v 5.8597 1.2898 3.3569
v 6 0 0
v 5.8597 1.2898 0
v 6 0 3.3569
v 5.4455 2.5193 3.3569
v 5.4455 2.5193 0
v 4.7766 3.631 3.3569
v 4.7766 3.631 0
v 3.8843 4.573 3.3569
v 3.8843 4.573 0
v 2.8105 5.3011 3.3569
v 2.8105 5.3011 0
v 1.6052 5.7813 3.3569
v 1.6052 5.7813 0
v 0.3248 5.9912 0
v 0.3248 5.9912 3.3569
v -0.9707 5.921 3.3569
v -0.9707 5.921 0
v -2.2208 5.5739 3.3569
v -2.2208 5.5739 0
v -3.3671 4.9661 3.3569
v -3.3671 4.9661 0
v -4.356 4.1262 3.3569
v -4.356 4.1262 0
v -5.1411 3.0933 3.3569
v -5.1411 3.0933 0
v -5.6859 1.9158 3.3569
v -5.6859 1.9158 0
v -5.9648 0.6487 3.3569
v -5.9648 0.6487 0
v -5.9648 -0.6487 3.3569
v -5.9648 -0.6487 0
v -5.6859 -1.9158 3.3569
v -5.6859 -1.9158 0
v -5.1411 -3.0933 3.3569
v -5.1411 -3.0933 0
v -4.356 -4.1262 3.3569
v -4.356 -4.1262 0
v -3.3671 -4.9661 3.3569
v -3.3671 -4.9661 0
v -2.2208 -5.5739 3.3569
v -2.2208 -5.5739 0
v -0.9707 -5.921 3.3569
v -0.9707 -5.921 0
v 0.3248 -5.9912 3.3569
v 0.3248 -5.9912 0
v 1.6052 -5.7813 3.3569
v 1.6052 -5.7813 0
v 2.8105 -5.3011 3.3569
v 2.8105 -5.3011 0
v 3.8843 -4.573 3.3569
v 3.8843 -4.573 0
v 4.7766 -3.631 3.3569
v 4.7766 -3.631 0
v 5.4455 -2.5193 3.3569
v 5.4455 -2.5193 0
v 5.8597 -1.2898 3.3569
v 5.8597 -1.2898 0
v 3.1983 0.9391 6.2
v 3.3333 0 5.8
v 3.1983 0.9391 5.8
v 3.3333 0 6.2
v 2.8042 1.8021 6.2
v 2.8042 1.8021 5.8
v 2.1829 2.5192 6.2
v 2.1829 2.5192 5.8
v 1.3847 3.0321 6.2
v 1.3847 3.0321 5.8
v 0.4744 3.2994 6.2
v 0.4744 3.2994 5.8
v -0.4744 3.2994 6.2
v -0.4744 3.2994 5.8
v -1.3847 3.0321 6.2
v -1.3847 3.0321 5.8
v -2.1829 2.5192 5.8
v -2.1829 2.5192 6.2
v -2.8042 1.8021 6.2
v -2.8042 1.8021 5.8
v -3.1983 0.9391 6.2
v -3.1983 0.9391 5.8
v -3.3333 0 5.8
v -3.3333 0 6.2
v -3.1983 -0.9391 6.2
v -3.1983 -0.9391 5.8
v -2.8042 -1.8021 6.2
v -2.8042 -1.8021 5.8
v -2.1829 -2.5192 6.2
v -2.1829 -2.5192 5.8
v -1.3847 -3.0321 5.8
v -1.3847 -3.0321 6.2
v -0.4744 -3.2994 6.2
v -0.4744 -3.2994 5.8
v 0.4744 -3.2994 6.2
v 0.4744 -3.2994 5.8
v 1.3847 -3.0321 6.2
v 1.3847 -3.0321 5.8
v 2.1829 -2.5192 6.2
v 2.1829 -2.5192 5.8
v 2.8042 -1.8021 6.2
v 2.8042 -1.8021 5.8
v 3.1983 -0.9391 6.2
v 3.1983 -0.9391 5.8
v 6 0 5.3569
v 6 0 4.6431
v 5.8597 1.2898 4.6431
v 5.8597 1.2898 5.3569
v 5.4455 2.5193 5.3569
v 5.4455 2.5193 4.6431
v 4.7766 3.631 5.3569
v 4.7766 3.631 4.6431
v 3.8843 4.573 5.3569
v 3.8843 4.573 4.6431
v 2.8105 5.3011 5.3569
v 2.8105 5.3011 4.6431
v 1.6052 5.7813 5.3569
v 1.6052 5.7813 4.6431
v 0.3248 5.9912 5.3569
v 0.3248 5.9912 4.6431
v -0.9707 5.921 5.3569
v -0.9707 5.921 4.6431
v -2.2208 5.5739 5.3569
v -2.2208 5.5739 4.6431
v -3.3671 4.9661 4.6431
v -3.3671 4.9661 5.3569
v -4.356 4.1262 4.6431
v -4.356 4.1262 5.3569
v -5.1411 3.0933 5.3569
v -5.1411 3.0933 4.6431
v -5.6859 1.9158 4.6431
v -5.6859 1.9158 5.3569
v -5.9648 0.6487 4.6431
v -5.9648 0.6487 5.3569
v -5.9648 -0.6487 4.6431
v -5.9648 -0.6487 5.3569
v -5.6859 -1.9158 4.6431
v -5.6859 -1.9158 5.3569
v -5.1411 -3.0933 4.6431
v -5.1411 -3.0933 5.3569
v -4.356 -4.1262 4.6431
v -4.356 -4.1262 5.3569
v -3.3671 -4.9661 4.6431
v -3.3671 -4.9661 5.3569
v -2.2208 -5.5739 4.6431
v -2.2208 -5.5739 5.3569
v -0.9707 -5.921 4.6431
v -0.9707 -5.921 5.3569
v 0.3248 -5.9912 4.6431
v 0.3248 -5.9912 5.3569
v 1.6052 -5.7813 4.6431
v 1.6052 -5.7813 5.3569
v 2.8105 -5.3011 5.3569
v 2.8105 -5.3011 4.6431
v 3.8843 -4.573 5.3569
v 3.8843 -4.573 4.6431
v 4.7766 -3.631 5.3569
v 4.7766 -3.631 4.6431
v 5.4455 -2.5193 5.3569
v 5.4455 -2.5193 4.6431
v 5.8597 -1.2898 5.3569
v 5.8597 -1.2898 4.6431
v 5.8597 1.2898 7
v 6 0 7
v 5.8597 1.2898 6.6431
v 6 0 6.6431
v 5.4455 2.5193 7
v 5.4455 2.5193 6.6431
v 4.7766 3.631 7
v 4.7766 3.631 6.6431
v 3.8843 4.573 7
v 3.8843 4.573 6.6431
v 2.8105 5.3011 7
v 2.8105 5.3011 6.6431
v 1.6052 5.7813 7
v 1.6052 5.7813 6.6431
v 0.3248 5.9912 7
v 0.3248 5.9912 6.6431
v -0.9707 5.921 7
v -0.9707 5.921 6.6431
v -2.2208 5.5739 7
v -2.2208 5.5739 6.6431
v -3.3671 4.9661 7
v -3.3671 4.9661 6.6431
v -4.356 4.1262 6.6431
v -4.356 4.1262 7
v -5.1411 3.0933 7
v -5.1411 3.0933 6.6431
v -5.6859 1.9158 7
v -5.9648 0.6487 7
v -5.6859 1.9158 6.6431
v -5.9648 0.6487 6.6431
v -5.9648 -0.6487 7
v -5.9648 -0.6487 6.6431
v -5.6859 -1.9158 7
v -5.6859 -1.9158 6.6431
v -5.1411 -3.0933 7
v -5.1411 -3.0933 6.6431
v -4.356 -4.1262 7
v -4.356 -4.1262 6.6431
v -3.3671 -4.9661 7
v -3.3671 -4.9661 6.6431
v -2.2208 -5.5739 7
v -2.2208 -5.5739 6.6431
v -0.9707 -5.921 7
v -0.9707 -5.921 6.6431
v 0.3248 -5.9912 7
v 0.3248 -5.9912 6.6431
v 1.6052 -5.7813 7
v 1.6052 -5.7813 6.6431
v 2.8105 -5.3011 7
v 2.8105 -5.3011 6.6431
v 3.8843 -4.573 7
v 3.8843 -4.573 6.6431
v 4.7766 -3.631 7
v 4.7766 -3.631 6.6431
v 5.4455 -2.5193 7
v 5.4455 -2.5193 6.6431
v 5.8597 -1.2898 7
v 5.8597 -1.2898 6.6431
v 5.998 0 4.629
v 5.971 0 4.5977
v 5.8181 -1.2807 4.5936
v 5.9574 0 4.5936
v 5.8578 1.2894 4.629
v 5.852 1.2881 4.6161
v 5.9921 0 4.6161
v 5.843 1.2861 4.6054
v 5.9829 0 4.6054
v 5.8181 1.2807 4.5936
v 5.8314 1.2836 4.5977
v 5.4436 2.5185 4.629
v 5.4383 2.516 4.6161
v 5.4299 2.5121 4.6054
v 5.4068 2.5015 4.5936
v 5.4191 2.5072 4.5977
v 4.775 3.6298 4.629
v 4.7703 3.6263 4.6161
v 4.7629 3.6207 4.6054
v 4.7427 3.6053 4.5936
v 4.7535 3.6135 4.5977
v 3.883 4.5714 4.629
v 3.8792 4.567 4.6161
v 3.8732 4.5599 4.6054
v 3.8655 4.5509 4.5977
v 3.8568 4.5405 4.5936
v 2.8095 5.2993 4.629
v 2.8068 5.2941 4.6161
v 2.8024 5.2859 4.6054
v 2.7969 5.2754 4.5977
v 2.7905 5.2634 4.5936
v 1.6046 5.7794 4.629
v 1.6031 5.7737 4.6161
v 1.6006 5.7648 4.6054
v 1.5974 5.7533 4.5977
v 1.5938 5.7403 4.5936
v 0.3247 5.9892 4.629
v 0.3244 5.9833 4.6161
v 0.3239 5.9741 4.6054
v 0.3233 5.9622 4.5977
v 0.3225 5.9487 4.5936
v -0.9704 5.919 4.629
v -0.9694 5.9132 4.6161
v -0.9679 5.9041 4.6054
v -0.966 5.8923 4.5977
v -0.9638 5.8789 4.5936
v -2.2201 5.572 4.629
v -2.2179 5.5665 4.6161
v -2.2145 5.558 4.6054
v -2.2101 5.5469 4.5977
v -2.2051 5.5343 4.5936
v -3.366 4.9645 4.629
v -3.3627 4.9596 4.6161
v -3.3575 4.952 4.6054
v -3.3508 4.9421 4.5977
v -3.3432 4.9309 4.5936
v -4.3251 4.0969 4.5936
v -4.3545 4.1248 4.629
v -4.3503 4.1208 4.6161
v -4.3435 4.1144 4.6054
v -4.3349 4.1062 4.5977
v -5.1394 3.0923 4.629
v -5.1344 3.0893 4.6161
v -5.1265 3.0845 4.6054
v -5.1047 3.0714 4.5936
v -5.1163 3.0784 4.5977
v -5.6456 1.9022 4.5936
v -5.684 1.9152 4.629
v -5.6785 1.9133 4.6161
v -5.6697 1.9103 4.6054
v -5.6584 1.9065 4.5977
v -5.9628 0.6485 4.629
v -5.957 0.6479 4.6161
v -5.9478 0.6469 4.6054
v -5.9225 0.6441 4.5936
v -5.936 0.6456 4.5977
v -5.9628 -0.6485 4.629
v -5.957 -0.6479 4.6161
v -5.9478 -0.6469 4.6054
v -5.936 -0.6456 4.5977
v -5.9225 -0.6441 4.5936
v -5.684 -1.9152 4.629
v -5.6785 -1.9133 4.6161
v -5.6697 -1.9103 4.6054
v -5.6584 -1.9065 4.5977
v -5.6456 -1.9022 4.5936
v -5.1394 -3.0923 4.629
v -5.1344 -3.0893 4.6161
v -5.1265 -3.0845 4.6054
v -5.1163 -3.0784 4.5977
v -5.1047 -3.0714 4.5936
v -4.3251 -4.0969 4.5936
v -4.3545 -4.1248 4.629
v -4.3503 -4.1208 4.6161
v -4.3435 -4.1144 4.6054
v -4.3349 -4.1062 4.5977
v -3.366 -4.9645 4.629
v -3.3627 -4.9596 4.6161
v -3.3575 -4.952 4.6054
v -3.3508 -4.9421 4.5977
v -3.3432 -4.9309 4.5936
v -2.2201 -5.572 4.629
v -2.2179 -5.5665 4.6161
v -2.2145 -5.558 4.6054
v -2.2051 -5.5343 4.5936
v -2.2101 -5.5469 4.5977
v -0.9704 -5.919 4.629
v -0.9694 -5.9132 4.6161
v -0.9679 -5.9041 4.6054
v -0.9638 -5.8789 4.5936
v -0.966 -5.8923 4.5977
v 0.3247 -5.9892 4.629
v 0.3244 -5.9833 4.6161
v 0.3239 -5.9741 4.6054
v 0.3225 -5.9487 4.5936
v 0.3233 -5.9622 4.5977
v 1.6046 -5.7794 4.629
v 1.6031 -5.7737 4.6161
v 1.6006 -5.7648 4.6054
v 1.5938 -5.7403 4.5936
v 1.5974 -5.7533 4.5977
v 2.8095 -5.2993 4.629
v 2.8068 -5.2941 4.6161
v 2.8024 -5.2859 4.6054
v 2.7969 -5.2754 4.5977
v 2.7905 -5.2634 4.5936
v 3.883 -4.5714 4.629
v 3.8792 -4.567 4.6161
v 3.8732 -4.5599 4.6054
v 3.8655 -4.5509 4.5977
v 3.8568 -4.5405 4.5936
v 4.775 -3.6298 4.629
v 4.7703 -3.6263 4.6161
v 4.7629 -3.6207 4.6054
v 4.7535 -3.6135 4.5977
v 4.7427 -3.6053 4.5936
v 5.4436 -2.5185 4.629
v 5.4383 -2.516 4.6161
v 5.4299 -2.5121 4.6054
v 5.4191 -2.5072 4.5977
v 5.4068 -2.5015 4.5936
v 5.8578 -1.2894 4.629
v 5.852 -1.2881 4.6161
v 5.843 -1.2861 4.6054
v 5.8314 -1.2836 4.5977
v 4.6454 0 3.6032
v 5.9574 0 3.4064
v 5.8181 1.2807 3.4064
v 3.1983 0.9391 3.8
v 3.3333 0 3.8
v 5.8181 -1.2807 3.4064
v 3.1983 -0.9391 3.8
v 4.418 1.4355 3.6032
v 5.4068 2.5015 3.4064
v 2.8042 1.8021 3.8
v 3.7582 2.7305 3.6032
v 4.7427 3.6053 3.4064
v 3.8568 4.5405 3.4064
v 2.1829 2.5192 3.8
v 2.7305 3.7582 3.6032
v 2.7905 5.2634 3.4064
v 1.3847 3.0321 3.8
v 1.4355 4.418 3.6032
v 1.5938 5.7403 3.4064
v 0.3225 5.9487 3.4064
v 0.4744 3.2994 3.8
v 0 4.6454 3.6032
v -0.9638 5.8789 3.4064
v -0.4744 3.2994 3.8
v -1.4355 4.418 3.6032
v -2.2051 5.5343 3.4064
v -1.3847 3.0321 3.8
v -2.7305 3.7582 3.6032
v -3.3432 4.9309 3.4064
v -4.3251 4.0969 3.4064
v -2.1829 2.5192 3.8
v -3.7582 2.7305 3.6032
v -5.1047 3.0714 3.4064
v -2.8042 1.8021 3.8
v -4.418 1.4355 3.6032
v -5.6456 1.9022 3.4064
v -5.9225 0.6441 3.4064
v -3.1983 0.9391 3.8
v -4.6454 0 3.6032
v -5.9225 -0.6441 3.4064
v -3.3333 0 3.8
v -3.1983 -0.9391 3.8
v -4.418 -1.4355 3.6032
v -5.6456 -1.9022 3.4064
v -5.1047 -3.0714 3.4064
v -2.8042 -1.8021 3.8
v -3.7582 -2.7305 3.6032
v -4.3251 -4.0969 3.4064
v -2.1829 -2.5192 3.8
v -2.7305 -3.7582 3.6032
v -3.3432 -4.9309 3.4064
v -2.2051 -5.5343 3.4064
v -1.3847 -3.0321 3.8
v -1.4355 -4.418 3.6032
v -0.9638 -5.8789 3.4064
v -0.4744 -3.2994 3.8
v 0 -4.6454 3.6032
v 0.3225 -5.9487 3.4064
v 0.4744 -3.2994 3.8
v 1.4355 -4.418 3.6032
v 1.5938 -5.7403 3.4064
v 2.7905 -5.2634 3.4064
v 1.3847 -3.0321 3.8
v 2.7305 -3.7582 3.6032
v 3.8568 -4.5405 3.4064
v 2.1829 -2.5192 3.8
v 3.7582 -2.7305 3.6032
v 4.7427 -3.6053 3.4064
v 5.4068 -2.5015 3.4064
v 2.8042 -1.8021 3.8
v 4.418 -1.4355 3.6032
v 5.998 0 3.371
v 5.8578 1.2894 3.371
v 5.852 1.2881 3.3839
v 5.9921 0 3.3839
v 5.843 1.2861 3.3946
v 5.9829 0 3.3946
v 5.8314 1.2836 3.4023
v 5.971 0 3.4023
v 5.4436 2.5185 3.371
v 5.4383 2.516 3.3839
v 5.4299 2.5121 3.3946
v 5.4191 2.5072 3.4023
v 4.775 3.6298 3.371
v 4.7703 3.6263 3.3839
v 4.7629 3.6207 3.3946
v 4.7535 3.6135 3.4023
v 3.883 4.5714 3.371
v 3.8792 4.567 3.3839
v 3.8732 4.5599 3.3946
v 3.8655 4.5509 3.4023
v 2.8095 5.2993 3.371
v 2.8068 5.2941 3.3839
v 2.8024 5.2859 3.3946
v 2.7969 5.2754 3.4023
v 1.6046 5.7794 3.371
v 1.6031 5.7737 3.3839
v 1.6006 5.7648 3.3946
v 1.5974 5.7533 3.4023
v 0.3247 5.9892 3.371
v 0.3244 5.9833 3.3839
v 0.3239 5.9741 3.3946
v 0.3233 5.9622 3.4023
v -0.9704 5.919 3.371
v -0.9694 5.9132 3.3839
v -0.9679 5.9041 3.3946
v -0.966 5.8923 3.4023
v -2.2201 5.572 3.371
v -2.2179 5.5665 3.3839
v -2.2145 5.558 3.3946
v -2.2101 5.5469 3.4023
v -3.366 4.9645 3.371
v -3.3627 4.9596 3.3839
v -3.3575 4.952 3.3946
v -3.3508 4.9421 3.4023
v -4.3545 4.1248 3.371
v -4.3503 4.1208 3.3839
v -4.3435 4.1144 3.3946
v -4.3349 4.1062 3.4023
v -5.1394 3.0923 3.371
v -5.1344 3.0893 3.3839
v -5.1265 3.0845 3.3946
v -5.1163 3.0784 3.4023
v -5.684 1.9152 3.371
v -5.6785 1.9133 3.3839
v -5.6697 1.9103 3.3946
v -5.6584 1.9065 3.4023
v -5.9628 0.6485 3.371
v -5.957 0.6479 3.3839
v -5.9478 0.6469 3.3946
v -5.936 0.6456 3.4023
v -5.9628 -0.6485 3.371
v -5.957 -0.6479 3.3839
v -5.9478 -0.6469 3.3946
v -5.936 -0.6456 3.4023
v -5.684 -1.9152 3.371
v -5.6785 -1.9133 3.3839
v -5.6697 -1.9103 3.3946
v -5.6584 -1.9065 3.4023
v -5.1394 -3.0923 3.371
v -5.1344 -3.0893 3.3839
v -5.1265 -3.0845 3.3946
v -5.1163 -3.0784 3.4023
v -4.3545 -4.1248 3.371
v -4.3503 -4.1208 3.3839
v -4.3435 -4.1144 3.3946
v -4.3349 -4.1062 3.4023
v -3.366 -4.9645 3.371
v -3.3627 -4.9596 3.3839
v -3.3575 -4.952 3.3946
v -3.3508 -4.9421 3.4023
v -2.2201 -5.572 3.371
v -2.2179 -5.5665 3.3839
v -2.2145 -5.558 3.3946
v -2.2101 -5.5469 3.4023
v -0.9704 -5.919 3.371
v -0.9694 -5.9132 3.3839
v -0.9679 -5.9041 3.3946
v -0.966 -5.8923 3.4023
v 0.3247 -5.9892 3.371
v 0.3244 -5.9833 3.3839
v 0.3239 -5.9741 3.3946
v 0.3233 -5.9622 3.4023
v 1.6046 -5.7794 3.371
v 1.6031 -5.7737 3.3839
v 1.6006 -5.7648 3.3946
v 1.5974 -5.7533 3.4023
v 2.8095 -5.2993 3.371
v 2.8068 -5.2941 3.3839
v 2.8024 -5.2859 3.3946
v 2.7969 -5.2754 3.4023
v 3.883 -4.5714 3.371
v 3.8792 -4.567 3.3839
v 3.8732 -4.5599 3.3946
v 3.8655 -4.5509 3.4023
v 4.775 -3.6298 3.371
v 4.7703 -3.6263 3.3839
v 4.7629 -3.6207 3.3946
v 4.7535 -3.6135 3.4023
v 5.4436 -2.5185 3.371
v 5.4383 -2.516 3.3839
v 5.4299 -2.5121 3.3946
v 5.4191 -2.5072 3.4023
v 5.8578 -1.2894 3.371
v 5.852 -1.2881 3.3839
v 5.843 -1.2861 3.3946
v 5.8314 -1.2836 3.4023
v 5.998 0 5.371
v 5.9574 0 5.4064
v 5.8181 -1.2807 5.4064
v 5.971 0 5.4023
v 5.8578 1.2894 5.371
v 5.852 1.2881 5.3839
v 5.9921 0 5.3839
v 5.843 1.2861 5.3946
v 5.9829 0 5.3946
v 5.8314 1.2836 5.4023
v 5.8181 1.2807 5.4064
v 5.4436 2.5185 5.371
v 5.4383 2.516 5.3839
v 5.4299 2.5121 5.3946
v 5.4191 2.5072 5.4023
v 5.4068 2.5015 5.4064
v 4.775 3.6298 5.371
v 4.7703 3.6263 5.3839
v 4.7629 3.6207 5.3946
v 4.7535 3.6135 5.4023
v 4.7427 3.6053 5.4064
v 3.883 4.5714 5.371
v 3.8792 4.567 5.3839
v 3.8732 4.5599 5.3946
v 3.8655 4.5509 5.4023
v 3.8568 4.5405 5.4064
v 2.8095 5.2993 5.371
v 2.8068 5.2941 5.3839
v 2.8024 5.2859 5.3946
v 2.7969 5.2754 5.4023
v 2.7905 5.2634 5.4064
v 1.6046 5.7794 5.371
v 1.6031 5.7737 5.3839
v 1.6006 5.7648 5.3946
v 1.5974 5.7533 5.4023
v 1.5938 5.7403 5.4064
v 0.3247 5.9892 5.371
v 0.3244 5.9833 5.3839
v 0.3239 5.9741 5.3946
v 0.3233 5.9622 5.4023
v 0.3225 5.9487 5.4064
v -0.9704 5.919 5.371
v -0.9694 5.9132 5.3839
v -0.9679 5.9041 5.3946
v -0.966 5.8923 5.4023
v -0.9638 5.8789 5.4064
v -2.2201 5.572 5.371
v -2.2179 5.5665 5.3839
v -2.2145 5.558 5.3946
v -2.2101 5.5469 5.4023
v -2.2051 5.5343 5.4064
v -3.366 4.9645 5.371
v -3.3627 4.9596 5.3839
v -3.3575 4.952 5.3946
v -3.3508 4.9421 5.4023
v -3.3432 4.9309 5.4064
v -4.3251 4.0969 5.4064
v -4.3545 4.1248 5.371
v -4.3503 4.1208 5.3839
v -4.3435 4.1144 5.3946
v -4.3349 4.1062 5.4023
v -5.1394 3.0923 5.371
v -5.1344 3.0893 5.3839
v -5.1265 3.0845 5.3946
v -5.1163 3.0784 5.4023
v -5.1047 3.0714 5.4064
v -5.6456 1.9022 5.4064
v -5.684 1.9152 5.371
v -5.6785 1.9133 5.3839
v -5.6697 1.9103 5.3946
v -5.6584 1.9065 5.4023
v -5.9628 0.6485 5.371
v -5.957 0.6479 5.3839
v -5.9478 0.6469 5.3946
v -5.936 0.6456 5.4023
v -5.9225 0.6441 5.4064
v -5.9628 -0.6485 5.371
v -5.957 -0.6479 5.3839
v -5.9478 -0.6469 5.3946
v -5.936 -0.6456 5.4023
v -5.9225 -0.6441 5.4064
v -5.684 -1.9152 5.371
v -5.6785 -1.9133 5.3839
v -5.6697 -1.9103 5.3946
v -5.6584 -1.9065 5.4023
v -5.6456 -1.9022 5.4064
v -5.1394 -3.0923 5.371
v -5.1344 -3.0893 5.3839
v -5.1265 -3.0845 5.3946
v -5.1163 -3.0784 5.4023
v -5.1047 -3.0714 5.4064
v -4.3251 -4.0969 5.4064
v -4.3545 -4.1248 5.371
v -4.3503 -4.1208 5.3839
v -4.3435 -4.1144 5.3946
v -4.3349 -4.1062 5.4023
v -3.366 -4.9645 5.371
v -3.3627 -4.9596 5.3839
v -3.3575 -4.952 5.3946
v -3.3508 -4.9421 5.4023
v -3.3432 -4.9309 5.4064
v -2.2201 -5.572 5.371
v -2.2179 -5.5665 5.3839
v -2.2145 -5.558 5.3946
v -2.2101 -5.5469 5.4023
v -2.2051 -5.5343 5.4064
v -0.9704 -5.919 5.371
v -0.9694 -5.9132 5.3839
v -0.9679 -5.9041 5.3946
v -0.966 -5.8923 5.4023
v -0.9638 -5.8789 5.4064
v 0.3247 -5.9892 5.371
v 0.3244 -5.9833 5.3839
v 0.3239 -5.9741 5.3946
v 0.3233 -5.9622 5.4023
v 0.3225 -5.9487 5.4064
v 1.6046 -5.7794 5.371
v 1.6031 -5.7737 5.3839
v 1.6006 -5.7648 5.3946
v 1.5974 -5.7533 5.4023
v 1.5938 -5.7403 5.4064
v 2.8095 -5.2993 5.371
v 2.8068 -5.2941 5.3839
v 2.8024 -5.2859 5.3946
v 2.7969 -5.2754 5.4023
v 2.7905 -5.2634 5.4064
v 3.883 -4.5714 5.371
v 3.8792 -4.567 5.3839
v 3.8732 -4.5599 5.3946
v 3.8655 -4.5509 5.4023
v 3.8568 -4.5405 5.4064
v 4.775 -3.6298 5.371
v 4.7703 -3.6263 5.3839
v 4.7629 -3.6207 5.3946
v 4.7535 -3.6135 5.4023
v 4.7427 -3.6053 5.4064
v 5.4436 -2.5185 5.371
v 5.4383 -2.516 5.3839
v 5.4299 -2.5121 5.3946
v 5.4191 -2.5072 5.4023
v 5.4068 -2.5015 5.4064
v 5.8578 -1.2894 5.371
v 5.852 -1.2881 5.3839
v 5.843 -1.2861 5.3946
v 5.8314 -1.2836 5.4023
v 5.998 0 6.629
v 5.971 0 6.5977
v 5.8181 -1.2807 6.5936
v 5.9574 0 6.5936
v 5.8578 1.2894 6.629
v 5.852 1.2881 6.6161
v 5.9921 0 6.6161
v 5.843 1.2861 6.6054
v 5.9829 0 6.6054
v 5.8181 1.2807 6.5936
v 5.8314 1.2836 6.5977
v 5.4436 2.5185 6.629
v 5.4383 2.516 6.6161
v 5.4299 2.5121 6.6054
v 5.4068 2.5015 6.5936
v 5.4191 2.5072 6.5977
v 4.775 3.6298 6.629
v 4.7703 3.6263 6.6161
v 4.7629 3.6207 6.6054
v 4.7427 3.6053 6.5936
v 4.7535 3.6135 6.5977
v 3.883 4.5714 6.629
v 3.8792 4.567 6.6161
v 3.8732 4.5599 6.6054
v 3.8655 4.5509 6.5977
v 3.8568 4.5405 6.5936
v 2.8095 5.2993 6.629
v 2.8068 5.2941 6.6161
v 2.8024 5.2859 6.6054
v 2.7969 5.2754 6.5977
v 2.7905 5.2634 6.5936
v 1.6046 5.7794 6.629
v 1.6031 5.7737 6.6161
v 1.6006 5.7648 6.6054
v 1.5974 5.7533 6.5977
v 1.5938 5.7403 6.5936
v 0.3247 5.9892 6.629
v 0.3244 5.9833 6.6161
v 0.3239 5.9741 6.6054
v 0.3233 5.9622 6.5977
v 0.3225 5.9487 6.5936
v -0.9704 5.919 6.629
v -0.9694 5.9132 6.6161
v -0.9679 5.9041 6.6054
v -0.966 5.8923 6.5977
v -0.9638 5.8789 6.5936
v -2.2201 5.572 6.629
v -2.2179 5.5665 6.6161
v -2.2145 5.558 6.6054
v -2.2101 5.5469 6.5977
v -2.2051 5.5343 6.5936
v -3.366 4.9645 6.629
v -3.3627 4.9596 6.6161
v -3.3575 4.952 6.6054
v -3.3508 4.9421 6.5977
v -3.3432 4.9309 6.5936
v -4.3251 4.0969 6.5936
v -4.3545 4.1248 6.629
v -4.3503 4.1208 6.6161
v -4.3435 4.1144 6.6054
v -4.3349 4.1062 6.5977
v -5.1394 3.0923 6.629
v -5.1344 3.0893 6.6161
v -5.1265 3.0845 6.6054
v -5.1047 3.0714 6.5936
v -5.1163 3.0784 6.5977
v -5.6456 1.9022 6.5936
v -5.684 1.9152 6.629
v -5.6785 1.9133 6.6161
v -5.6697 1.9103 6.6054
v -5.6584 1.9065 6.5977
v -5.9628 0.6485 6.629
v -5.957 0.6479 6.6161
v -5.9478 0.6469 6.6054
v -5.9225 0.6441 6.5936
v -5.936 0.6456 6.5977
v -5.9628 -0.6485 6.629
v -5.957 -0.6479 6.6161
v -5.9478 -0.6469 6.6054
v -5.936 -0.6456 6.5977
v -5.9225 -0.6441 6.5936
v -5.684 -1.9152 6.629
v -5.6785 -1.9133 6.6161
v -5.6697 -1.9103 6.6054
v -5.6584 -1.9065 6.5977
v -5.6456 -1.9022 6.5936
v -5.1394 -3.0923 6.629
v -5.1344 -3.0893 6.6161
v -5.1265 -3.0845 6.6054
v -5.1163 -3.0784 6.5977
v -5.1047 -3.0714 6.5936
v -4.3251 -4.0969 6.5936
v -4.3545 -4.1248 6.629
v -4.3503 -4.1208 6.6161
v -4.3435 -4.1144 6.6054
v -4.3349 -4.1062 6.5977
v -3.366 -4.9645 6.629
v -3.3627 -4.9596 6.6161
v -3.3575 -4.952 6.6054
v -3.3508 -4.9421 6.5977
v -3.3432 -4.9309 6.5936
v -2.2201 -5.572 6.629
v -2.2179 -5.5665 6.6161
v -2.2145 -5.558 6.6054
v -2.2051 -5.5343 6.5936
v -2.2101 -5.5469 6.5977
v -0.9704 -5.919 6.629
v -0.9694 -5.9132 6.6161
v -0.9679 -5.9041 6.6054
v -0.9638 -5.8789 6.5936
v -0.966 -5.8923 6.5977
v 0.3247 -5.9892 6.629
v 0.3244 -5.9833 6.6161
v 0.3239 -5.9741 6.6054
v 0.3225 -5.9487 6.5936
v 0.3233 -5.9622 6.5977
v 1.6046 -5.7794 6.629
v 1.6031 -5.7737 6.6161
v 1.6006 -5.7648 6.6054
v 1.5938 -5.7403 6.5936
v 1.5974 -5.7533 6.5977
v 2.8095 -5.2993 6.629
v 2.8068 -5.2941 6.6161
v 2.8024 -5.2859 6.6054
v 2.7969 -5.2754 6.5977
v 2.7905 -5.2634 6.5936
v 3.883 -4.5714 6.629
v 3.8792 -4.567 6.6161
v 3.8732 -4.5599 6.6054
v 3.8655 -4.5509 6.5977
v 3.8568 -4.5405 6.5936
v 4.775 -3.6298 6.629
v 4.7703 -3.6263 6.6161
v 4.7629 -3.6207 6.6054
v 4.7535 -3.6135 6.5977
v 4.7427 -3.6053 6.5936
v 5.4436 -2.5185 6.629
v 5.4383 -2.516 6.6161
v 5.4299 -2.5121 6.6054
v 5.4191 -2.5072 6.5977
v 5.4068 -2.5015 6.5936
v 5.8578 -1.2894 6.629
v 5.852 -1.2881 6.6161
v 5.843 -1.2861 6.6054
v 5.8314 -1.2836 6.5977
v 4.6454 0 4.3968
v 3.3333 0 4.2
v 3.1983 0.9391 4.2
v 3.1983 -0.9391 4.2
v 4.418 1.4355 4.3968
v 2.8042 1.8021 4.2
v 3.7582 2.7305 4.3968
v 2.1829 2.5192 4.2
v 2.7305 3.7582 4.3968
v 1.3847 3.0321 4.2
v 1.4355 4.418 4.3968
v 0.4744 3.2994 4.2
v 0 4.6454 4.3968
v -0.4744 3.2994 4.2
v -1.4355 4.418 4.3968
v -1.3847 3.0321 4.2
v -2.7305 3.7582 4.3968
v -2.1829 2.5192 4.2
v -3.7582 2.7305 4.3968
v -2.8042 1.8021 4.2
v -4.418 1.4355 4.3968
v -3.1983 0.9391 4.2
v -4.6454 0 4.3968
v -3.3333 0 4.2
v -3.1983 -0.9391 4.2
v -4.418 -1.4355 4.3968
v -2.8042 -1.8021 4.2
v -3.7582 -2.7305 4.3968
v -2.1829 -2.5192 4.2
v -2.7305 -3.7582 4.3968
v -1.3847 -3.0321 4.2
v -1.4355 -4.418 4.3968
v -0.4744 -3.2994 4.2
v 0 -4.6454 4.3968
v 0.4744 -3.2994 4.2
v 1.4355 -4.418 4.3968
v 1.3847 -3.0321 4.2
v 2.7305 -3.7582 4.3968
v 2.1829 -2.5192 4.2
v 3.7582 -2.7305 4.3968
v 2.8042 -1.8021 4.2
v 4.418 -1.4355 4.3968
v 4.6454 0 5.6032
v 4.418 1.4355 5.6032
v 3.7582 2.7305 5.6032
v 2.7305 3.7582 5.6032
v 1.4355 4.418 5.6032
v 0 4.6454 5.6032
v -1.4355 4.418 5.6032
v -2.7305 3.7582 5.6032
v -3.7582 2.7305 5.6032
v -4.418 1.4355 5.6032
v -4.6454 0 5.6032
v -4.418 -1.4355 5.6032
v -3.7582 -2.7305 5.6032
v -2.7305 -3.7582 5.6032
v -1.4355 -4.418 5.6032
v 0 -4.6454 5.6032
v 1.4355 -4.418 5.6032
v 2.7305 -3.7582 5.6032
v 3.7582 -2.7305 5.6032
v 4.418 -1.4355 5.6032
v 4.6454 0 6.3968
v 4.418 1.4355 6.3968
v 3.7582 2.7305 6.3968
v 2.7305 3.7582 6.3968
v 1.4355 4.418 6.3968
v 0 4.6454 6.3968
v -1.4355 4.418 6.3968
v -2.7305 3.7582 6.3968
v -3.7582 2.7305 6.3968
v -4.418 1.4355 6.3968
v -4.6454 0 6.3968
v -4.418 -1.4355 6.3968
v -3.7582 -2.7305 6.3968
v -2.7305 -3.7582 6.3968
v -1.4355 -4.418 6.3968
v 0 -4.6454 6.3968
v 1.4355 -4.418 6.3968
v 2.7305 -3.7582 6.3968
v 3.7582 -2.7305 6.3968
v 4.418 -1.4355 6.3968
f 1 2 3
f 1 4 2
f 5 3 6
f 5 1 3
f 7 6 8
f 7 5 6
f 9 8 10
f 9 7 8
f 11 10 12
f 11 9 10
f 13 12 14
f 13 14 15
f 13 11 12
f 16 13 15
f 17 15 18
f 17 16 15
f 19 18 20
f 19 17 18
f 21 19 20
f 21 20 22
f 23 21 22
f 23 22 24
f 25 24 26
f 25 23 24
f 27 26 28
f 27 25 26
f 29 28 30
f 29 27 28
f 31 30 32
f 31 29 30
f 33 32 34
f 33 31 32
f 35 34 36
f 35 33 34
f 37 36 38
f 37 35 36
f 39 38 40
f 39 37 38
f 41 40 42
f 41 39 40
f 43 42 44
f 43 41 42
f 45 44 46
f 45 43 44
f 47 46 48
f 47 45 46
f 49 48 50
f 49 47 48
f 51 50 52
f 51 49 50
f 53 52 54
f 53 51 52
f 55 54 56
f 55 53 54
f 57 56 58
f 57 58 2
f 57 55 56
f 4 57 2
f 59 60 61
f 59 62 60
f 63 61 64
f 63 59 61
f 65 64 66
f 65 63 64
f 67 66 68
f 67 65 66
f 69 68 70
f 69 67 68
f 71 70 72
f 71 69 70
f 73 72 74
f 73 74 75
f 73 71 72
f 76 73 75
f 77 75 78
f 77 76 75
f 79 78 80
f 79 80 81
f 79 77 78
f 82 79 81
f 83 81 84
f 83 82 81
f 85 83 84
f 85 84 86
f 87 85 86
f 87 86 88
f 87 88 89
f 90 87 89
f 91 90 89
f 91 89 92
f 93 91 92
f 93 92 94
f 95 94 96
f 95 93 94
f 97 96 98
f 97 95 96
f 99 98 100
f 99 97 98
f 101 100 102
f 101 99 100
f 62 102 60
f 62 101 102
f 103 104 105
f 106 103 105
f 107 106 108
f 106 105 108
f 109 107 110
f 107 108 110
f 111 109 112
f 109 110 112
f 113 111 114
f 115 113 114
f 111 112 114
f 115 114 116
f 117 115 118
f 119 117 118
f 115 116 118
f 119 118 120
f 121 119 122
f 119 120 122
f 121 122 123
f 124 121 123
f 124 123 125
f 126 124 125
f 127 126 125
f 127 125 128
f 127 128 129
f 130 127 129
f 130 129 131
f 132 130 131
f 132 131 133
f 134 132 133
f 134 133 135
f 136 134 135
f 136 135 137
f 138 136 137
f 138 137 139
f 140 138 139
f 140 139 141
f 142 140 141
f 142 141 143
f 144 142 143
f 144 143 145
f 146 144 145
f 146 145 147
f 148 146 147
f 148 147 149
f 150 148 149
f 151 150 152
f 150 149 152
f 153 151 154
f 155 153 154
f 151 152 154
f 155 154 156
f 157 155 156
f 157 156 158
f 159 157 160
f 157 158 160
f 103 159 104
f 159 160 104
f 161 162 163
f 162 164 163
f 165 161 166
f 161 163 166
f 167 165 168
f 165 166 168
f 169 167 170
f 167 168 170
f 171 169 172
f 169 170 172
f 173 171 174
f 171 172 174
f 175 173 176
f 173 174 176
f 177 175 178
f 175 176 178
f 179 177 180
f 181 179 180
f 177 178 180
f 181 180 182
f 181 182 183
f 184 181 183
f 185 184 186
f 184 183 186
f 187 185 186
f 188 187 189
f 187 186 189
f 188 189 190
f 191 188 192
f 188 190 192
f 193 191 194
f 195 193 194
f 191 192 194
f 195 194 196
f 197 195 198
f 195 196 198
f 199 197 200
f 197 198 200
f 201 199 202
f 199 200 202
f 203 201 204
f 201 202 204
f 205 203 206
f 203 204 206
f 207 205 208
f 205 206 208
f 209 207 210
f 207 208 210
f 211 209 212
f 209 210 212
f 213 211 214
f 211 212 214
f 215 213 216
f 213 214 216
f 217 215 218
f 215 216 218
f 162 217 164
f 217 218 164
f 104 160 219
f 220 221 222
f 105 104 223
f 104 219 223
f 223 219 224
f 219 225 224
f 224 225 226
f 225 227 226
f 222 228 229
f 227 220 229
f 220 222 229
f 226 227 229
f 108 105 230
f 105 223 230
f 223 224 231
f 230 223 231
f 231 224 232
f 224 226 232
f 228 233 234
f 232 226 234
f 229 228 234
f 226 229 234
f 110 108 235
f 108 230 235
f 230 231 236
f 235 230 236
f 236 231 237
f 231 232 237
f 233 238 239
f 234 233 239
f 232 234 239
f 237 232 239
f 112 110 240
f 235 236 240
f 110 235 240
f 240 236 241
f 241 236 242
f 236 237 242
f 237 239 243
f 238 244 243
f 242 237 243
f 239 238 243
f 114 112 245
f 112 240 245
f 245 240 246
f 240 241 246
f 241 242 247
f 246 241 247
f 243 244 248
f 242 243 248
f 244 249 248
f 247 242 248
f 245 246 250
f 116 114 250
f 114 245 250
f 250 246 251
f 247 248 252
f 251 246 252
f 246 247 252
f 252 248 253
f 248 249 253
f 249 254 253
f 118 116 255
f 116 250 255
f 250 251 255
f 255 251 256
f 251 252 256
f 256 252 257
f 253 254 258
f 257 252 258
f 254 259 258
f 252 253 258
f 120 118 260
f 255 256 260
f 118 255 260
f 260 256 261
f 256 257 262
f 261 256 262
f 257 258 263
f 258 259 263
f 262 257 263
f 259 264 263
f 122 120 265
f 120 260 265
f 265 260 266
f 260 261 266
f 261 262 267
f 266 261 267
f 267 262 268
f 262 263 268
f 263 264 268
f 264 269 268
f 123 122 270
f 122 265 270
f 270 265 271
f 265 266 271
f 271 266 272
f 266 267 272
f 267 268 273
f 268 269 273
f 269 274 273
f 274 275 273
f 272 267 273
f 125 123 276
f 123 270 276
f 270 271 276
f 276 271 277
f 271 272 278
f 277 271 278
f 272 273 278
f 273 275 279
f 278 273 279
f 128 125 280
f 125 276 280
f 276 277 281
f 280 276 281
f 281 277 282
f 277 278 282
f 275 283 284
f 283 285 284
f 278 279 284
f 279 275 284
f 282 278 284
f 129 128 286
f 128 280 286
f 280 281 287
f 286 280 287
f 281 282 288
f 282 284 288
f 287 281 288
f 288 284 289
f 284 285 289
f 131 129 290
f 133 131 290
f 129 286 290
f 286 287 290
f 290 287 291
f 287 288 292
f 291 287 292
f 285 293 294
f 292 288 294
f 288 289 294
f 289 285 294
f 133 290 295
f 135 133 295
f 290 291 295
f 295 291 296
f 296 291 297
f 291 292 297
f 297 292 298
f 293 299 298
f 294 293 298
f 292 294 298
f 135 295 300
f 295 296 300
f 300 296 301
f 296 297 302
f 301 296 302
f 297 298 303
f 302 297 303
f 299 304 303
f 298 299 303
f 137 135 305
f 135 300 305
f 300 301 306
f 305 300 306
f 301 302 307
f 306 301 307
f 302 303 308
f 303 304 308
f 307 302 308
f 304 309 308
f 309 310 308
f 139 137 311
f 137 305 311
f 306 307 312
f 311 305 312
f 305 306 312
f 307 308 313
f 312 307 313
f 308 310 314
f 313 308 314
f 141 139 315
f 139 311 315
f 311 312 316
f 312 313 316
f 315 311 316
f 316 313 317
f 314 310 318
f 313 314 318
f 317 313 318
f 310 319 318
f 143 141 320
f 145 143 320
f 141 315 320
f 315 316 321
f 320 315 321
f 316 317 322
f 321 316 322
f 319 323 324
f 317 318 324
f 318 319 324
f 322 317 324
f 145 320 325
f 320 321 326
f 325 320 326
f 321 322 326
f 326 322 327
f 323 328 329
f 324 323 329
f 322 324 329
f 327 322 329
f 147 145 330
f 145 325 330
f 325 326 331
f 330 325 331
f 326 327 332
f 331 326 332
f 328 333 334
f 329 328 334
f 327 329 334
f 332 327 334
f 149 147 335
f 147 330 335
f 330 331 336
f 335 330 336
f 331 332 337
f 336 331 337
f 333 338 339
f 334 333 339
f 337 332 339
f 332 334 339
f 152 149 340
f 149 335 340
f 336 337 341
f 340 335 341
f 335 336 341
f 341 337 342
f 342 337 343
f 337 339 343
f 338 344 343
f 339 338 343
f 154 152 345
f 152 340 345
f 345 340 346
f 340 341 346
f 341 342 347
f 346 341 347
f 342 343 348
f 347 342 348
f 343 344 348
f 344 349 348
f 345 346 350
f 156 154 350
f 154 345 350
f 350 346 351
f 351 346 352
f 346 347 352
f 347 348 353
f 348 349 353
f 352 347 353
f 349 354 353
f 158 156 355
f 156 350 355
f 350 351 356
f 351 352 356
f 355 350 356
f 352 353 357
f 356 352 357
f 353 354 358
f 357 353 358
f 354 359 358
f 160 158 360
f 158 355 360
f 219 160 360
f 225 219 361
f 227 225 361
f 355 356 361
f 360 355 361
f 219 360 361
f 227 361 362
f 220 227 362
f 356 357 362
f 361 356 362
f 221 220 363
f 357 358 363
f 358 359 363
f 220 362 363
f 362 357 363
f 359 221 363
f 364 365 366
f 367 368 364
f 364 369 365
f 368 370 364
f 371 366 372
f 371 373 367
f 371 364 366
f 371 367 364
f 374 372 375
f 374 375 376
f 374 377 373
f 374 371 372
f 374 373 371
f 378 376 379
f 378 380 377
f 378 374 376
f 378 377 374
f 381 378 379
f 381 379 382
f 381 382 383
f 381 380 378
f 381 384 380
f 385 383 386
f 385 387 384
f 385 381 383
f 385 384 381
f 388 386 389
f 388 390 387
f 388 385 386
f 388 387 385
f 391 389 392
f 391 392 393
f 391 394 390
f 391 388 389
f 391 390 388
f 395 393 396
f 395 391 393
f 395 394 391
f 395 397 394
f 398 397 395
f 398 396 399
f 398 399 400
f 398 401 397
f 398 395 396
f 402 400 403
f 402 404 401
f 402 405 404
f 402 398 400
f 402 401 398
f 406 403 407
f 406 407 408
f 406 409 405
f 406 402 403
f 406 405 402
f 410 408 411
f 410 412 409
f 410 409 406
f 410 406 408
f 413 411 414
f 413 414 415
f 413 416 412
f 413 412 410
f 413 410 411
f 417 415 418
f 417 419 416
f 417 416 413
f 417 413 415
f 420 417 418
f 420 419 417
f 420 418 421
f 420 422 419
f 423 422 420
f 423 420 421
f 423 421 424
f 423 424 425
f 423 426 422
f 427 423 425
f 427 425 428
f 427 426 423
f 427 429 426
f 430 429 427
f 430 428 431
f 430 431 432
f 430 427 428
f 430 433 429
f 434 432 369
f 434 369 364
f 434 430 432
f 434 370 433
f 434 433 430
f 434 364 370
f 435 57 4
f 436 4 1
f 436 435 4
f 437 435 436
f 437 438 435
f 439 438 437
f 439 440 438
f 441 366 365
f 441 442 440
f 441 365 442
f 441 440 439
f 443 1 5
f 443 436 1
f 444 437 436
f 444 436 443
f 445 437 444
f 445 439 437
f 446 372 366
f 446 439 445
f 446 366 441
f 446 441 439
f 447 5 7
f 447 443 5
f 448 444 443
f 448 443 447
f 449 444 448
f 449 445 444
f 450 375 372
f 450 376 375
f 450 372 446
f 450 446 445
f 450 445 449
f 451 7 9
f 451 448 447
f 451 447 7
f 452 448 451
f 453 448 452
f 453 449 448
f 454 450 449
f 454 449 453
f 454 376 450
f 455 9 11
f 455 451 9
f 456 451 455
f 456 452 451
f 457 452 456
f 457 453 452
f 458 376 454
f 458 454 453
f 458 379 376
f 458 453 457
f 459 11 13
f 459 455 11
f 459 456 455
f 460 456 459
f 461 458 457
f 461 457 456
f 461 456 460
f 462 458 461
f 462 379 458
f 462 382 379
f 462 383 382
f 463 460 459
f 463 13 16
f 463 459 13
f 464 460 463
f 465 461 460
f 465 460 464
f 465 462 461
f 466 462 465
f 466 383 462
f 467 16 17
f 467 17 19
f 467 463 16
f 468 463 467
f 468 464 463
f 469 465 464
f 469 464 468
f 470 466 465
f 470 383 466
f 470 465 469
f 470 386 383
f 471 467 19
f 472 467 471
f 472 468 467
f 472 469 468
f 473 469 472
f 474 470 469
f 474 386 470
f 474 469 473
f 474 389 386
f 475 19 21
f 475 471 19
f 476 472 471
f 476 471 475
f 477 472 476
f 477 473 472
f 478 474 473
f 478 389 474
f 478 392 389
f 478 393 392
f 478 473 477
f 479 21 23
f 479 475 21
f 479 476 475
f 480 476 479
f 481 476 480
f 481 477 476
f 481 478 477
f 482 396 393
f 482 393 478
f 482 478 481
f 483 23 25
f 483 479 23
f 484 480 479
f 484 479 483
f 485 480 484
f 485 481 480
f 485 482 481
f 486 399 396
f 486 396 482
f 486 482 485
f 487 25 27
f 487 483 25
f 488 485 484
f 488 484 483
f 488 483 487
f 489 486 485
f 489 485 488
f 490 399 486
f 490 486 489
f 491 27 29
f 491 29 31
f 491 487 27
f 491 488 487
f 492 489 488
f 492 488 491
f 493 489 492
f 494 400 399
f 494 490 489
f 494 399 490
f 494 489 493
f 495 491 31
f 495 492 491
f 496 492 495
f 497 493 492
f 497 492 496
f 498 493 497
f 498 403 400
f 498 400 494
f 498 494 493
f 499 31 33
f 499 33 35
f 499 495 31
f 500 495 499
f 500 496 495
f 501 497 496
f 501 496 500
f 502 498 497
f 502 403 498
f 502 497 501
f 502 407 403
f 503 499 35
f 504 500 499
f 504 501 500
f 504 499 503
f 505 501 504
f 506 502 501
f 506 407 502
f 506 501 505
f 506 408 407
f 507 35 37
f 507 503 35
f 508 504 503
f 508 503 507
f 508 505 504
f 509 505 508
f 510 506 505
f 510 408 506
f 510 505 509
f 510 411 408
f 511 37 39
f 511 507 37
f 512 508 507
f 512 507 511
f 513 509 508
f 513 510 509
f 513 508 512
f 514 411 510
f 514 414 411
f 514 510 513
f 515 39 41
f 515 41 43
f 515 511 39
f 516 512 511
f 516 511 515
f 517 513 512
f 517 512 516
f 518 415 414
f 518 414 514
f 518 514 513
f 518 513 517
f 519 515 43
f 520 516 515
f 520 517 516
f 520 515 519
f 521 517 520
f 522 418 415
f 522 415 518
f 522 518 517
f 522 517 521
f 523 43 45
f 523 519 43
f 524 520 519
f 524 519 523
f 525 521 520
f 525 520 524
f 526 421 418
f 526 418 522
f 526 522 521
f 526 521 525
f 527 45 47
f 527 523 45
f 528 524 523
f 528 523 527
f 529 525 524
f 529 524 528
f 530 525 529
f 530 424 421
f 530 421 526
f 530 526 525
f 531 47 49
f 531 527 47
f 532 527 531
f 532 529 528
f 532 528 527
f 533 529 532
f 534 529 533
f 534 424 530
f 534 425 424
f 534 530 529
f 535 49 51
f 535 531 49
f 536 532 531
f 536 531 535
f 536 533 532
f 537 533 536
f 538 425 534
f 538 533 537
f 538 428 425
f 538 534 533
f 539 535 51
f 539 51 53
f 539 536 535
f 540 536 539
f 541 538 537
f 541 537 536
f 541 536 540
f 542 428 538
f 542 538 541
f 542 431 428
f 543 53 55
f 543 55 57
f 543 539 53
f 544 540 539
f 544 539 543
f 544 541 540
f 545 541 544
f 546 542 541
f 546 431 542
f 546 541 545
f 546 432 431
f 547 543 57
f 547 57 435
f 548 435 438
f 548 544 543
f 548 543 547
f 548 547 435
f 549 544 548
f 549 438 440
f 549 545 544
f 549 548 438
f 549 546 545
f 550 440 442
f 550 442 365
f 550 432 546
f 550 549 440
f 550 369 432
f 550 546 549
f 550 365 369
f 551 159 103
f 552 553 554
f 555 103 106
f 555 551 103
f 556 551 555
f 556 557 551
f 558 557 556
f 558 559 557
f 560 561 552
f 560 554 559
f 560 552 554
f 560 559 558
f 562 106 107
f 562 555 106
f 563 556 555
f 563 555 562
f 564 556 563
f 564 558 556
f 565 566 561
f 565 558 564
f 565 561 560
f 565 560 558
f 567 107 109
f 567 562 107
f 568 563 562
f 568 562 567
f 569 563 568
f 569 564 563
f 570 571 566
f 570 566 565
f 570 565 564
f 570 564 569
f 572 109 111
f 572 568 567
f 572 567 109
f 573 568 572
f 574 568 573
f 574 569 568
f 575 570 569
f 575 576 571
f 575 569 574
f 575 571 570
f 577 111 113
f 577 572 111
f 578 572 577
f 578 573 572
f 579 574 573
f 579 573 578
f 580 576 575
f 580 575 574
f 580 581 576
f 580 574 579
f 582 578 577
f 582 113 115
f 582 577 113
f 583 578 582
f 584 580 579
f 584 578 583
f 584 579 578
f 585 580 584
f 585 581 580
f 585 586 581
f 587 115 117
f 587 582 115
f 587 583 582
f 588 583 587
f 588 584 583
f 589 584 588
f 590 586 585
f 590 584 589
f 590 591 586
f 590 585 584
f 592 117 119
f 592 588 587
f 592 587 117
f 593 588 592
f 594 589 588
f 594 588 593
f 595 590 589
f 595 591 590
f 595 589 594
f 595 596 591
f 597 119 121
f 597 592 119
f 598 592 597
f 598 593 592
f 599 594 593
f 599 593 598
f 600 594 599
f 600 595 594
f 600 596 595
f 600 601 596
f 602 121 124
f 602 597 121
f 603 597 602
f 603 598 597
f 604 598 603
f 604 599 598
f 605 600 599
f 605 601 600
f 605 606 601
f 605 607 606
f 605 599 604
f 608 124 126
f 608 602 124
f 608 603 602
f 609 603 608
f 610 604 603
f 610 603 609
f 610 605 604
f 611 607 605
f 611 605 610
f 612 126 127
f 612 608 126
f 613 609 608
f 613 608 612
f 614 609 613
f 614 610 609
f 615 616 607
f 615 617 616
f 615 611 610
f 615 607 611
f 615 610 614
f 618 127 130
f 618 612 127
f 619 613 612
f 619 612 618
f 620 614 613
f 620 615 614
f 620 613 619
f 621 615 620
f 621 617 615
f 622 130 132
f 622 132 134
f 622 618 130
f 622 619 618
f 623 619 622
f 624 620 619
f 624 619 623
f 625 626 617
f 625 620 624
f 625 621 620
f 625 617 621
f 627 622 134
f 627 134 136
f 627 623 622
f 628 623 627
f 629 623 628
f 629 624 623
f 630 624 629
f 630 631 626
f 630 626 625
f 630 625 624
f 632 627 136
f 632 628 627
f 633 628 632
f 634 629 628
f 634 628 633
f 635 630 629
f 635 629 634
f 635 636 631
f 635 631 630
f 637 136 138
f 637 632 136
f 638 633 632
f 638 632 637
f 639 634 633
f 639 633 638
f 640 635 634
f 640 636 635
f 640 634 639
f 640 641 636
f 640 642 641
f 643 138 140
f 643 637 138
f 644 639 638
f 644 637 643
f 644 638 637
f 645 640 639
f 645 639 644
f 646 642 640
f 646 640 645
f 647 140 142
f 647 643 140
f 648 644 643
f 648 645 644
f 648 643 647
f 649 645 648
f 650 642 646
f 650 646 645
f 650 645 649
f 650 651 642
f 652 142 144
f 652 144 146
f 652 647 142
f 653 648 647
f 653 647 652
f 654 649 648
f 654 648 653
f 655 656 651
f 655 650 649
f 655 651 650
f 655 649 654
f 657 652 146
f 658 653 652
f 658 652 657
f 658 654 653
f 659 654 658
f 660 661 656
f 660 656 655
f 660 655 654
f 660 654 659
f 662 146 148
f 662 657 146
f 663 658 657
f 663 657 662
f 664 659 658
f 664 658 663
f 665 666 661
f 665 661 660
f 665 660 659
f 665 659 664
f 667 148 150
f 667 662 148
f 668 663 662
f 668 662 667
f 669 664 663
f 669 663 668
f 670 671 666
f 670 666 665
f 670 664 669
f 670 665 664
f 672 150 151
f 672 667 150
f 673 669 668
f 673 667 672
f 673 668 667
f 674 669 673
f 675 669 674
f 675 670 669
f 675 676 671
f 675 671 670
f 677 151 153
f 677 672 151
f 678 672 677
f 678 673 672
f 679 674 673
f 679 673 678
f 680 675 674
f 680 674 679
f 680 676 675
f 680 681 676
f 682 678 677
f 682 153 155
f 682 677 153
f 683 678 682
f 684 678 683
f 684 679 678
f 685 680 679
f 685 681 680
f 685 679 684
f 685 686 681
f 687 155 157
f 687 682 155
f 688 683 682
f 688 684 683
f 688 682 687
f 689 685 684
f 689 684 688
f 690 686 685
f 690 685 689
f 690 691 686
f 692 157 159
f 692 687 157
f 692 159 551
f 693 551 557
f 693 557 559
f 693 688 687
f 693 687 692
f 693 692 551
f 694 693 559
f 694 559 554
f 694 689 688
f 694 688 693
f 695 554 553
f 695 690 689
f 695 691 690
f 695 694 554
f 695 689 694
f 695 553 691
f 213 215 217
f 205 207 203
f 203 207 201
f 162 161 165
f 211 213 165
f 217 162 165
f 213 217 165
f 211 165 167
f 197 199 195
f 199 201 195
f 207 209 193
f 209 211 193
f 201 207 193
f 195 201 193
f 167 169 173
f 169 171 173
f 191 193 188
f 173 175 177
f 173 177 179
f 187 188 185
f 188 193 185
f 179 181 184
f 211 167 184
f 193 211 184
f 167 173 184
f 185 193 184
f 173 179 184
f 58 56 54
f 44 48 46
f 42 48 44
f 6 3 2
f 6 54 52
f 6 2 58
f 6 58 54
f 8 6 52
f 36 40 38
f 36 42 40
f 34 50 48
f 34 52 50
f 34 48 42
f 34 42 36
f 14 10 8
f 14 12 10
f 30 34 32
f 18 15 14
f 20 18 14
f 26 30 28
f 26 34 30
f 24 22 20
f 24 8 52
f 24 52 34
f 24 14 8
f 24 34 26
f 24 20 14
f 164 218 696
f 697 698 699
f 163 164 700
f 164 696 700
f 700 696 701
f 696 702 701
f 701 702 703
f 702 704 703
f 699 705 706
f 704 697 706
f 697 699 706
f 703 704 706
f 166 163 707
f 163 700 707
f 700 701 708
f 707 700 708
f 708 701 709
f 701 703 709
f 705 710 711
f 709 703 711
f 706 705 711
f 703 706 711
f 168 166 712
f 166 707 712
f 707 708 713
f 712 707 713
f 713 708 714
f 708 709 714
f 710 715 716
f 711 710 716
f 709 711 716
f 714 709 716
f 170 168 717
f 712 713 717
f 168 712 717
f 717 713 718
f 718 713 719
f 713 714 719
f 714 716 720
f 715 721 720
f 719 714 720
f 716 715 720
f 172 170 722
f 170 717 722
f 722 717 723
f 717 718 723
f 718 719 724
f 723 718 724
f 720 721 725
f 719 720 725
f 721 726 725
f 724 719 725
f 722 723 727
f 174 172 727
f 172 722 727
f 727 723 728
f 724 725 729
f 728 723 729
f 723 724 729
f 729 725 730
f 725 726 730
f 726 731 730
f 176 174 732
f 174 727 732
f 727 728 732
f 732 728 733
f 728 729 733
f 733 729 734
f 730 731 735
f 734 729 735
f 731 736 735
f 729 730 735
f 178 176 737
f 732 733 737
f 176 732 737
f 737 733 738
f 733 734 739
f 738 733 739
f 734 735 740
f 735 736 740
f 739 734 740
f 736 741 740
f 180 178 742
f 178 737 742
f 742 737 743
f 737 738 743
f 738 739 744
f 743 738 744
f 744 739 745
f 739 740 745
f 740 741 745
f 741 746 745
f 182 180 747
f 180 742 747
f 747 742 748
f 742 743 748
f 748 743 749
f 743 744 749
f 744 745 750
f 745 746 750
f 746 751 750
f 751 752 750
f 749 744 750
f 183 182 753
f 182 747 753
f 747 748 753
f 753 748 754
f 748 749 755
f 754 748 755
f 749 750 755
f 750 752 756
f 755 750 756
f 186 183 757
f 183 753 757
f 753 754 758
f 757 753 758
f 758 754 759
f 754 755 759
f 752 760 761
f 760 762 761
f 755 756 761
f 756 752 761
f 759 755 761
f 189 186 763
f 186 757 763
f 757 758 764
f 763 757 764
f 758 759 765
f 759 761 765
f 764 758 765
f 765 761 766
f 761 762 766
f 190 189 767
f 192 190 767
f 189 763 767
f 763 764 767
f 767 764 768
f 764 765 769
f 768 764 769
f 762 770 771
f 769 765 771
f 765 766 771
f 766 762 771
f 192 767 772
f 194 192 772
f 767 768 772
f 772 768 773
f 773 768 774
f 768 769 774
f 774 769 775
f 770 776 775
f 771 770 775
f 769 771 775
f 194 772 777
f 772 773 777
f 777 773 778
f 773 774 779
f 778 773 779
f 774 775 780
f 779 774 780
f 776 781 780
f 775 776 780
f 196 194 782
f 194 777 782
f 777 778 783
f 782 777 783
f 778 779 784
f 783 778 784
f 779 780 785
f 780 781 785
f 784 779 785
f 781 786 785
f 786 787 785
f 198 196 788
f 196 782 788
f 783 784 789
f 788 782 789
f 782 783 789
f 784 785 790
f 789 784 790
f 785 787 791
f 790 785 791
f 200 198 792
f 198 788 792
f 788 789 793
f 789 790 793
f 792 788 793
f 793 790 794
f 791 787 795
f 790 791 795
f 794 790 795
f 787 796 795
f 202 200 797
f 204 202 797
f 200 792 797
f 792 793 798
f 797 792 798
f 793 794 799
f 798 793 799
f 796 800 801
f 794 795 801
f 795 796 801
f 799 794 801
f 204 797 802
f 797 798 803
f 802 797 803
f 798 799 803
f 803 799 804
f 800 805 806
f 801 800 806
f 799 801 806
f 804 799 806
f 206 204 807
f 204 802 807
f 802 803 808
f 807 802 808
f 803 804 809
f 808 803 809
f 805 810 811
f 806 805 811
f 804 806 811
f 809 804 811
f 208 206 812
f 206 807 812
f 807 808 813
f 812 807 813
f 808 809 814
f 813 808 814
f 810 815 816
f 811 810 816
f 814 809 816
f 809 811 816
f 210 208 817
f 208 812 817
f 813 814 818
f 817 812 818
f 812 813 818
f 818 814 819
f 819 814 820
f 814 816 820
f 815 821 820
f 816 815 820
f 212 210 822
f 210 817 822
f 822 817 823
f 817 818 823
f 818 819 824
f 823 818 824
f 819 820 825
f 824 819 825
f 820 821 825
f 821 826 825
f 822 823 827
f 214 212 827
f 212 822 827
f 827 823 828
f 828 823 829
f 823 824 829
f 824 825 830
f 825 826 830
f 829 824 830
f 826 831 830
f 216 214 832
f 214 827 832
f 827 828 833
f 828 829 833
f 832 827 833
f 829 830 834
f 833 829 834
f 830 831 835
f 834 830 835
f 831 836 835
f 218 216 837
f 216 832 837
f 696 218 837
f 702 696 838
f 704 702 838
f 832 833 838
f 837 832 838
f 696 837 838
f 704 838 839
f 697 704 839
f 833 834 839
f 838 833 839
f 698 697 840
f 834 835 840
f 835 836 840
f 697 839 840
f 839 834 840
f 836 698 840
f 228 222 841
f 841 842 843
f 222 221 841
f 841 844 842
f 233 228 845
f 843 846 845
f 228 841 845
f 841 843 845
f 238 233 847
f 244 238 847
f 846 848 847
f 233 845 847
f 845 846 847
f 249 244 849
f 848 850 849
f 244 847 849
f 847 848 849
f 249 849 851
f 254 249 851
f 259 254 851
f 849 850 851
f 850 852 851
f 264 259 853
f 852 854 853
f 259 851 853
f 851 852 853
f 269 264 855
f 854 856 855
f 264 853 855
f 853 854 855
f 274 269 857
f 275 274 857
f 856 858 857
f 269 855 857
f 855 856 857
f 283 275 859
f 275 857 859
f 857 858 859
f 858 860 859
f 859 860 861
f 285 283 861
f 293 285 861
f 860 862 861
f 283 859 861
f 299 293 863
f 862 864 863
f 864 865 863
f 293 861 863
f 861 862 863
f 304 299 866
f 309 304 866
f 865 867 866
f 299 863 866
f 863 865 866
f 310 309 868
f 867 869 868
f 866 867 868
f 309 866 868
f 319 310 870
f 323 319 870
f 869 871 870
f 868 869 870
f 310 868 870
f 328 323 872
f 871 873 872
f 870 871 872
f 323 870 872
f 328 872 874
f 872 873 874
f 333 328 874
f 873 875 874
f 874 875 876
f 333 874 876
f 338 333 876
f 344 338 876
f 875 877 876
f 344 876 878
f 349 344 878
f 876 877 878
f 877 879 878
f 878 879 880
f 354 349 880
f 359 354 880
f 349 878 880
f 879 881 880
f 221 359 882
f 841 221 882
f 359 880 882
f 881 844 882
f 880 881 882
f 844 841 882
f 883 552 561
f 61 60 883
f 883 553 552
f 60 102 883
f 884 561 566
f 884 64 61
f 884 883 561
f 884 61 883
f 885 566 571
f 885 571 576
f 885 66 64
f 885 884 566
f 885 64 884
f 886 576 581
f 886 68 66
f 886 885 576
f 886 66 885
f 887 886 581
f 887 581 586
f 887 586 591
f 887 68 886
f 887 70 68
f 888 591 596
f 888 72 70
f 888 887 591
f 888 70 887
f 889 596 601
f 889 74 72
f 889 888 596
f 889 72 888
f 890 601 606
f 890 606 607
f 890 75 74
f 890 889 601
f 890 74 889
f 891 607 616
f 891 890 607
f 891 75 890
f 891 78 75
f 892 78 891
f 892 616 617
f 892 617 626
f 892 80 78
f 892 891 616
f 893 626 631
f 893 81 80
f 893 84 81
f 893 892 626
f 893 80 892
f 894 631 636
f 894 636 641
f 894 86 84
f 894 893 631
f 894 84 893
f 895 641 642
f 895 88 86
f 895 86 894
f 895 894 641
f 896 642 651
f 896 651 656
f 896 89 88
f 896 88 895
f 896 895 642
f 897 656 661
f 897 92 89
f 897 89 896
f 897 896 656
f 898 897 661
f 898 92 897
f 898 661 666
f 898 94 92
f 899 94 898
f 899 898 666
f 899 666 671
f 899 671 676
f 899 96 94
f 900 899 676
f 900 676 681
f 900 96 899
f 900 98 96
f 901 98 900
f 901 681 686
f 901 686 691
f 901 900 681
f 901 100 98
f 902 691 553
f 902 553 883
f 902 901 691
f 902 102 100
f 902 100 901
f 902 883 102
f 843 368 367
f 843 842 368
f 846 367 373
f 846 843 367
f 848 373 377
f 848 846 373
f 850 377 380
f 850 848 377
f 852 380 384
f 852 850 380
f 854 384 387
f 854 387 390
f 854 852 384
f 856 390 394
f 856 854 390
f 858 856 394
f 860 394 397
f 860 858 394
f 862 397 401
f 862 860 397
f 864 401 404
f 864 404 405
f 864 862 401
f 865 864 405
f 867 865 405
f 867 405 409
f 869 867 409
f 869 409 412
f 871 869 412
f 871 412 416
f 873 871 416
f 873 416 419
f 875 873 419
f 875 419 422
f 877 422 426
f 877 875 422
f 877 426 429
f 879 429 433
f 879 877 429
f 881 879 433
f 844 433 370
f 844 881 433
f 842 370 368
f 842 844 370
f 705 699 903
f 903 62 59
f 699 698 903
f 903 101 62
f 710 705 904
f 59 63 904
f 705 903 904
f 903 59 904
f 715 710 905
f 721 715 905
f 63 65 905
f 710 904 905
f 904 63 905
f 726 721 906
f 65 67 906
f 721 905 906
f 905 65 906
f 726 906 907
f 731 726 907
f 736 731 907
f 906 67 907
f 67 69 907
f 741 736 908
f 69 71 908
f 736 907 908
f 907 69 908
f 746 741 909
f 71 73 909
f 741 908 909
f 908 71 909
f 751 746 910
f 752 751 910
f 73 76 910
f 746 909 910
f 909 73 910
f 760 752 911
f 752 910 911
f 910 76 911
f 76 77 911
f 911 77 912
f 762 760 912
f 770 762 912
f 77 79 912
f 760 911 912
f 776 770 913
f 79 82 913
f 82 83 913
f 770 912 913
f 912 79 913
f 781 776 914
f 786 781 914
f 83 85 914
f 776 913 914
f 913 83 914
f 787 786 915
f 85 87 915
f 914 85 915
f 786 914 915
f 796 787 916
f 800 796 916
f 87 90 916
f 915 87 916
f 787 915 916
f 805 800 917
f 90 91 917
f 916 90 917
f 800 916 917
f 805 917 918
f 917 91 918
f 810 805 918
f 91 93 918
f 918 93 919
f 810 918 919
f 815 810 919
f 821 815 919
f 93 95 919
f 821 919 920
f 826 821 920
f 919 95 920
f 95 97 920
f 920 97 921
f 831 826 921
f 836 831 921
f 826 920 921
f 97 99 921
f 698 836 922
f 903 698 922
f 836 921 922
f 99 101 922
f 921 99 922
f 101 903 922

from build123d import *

# Parameters (mm, degrees)
F4_DEPTH = 3


with BuildPart() as f1:
    # F0 (on Front) → F1 (revolve)
    with BuildSketch(Plane.XZ):
        with BuildLine():
            Line((0, 4), (0, 3))
            Line((0, 3), (6, 3))
            Line((6, 3), (6, 3.356940629))
            ThreePointArc((6, 3.356940629), (5.9878870105, 3.3895684458), (5.9574170226, 3.4063874466))
            Line((5.9574170226, 3.4063874466), (3.3333333333, 3.8))
            Line((3.3333333333, 3.8), (2, 4))
            Line((2, 4), (0, 4))
        make_face()
        Polygon((3.3333333333, 4), (2, 4), (3.3333333333, 3.8), align=None)
    revolve(axis=Axis((0, 0, 3.5), (0, 0, 1)))

    # F2: F1 across face


with BuildPart() as f1_1:
    add(f1.part)
    add(f1.part.mirror(Plane.XY.offset(4)))

    # F3: F1 across face


with BuildPart() as f1_2:
    add(f1_1.part)
    add(f1_1.part.mirror(Plane.XY.offset(5)))

    # F4 (add, through all): a face of the model
    f4_faces = [f1_2.faces().sort_by_distance(p)[0] for p in [
        (0, 0, 3),
    ]]
    extrude(f4_faces, amount=F4_DEPTH)


solid = f1_2.part
